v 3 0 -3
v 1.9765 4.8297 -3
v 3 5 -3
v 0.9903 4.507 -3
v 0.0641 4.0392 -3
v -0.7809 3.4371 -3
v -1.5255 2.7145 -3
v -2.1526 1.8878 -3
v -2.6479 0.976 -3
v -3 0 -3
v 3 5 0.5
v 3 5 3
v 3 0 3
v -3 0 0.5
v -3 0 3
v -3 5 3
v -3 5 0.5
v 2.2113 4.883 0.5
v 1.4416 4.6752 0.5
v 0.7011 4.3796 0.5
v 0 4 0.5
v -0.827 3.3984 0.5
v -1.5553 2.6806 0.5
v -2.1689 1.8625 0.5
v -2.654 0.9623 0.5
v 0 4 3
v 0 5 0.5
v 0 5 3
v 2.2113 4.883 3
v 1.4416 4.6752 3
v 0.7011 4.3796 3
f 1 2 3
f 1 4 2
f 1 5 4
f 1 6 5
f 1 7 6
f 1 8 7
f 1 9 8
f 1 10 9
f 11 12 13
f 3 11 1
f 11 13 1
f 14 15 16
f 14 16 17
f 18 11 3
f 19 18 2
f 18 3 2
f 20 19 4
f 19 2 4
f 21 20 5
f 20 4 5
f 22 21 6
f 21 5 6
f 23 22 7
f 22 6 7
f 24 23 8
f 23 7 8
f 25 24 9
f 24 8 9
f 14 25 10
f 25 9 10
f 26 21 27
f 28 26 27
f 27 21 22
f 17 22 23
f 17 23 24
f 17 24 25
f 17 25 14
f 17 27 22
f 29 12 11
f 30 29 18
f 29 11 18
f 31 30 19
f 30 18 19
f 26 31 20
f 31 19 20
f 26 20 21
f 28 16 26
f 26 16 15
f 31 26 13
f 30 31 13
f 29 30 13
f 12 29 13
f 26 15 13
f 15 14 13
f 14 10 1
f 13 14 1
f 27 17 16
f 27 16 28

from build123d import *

# Parameters (mm, degrees)
SKETCH1_W           = 6
SKETCH1_H           = 6
BOSS_EXTRUDE1_DEPTH = 5
CUT_EXTRUDE12_DEPTH = 3.5
CUT_EXTRUDE13_DEPTH = 3.5


with BuildPart() as part:
    # Sketch1 → Boss-Extrude1 (new body)
    with BuildSketch(Plane(origin=(0, 0, 0), x_dir=(1, 0, 0), z_dir=(0, 1, 0))):
        Rectangle(SKETCH1_W, SKETCH1_H)
    extrude(amount=BOSS_EXTRUDE1_DEPTH)

    # Sketch13 → Cut-Extrude12 (cut)
    with BuildSketch(Plane(origin=(0, 0, -3), x_dir=(-1, 0, 0), z_dir=(0, 0, -1))):
        with BuildLine():
            ThreePointArc((-3, 5), (0.780941195, 3.437129434), (3, 0))
            Line((3, 0), (3, 5))
            Line((3, 5), (-3, 5))
        make_face()
    extrude(amount=-CUT_EXTRUDE12_DEPTH, mode=Mode.SUBTRACT)

    # Sketch14 → Cut-Extrude13 (cut)
    with BuildSketch(Plane(origin=(0, 0, 0.5), x_dir=(-1, 0, 0), z_dir=(0, 0, -1))):
        with BuildLine():
            ThreePointArc((-3, 5), (-1.441597312, 4.675208063), (0, 4))
            Line((0, 4), (0, 5))
            Line((0, 5), (-3, 5))
        make_face()
    extrude(amount=-CUT_EXTRUDE13_DEPTH, mode=Mode.SUBTRACT)


solid = part.part
